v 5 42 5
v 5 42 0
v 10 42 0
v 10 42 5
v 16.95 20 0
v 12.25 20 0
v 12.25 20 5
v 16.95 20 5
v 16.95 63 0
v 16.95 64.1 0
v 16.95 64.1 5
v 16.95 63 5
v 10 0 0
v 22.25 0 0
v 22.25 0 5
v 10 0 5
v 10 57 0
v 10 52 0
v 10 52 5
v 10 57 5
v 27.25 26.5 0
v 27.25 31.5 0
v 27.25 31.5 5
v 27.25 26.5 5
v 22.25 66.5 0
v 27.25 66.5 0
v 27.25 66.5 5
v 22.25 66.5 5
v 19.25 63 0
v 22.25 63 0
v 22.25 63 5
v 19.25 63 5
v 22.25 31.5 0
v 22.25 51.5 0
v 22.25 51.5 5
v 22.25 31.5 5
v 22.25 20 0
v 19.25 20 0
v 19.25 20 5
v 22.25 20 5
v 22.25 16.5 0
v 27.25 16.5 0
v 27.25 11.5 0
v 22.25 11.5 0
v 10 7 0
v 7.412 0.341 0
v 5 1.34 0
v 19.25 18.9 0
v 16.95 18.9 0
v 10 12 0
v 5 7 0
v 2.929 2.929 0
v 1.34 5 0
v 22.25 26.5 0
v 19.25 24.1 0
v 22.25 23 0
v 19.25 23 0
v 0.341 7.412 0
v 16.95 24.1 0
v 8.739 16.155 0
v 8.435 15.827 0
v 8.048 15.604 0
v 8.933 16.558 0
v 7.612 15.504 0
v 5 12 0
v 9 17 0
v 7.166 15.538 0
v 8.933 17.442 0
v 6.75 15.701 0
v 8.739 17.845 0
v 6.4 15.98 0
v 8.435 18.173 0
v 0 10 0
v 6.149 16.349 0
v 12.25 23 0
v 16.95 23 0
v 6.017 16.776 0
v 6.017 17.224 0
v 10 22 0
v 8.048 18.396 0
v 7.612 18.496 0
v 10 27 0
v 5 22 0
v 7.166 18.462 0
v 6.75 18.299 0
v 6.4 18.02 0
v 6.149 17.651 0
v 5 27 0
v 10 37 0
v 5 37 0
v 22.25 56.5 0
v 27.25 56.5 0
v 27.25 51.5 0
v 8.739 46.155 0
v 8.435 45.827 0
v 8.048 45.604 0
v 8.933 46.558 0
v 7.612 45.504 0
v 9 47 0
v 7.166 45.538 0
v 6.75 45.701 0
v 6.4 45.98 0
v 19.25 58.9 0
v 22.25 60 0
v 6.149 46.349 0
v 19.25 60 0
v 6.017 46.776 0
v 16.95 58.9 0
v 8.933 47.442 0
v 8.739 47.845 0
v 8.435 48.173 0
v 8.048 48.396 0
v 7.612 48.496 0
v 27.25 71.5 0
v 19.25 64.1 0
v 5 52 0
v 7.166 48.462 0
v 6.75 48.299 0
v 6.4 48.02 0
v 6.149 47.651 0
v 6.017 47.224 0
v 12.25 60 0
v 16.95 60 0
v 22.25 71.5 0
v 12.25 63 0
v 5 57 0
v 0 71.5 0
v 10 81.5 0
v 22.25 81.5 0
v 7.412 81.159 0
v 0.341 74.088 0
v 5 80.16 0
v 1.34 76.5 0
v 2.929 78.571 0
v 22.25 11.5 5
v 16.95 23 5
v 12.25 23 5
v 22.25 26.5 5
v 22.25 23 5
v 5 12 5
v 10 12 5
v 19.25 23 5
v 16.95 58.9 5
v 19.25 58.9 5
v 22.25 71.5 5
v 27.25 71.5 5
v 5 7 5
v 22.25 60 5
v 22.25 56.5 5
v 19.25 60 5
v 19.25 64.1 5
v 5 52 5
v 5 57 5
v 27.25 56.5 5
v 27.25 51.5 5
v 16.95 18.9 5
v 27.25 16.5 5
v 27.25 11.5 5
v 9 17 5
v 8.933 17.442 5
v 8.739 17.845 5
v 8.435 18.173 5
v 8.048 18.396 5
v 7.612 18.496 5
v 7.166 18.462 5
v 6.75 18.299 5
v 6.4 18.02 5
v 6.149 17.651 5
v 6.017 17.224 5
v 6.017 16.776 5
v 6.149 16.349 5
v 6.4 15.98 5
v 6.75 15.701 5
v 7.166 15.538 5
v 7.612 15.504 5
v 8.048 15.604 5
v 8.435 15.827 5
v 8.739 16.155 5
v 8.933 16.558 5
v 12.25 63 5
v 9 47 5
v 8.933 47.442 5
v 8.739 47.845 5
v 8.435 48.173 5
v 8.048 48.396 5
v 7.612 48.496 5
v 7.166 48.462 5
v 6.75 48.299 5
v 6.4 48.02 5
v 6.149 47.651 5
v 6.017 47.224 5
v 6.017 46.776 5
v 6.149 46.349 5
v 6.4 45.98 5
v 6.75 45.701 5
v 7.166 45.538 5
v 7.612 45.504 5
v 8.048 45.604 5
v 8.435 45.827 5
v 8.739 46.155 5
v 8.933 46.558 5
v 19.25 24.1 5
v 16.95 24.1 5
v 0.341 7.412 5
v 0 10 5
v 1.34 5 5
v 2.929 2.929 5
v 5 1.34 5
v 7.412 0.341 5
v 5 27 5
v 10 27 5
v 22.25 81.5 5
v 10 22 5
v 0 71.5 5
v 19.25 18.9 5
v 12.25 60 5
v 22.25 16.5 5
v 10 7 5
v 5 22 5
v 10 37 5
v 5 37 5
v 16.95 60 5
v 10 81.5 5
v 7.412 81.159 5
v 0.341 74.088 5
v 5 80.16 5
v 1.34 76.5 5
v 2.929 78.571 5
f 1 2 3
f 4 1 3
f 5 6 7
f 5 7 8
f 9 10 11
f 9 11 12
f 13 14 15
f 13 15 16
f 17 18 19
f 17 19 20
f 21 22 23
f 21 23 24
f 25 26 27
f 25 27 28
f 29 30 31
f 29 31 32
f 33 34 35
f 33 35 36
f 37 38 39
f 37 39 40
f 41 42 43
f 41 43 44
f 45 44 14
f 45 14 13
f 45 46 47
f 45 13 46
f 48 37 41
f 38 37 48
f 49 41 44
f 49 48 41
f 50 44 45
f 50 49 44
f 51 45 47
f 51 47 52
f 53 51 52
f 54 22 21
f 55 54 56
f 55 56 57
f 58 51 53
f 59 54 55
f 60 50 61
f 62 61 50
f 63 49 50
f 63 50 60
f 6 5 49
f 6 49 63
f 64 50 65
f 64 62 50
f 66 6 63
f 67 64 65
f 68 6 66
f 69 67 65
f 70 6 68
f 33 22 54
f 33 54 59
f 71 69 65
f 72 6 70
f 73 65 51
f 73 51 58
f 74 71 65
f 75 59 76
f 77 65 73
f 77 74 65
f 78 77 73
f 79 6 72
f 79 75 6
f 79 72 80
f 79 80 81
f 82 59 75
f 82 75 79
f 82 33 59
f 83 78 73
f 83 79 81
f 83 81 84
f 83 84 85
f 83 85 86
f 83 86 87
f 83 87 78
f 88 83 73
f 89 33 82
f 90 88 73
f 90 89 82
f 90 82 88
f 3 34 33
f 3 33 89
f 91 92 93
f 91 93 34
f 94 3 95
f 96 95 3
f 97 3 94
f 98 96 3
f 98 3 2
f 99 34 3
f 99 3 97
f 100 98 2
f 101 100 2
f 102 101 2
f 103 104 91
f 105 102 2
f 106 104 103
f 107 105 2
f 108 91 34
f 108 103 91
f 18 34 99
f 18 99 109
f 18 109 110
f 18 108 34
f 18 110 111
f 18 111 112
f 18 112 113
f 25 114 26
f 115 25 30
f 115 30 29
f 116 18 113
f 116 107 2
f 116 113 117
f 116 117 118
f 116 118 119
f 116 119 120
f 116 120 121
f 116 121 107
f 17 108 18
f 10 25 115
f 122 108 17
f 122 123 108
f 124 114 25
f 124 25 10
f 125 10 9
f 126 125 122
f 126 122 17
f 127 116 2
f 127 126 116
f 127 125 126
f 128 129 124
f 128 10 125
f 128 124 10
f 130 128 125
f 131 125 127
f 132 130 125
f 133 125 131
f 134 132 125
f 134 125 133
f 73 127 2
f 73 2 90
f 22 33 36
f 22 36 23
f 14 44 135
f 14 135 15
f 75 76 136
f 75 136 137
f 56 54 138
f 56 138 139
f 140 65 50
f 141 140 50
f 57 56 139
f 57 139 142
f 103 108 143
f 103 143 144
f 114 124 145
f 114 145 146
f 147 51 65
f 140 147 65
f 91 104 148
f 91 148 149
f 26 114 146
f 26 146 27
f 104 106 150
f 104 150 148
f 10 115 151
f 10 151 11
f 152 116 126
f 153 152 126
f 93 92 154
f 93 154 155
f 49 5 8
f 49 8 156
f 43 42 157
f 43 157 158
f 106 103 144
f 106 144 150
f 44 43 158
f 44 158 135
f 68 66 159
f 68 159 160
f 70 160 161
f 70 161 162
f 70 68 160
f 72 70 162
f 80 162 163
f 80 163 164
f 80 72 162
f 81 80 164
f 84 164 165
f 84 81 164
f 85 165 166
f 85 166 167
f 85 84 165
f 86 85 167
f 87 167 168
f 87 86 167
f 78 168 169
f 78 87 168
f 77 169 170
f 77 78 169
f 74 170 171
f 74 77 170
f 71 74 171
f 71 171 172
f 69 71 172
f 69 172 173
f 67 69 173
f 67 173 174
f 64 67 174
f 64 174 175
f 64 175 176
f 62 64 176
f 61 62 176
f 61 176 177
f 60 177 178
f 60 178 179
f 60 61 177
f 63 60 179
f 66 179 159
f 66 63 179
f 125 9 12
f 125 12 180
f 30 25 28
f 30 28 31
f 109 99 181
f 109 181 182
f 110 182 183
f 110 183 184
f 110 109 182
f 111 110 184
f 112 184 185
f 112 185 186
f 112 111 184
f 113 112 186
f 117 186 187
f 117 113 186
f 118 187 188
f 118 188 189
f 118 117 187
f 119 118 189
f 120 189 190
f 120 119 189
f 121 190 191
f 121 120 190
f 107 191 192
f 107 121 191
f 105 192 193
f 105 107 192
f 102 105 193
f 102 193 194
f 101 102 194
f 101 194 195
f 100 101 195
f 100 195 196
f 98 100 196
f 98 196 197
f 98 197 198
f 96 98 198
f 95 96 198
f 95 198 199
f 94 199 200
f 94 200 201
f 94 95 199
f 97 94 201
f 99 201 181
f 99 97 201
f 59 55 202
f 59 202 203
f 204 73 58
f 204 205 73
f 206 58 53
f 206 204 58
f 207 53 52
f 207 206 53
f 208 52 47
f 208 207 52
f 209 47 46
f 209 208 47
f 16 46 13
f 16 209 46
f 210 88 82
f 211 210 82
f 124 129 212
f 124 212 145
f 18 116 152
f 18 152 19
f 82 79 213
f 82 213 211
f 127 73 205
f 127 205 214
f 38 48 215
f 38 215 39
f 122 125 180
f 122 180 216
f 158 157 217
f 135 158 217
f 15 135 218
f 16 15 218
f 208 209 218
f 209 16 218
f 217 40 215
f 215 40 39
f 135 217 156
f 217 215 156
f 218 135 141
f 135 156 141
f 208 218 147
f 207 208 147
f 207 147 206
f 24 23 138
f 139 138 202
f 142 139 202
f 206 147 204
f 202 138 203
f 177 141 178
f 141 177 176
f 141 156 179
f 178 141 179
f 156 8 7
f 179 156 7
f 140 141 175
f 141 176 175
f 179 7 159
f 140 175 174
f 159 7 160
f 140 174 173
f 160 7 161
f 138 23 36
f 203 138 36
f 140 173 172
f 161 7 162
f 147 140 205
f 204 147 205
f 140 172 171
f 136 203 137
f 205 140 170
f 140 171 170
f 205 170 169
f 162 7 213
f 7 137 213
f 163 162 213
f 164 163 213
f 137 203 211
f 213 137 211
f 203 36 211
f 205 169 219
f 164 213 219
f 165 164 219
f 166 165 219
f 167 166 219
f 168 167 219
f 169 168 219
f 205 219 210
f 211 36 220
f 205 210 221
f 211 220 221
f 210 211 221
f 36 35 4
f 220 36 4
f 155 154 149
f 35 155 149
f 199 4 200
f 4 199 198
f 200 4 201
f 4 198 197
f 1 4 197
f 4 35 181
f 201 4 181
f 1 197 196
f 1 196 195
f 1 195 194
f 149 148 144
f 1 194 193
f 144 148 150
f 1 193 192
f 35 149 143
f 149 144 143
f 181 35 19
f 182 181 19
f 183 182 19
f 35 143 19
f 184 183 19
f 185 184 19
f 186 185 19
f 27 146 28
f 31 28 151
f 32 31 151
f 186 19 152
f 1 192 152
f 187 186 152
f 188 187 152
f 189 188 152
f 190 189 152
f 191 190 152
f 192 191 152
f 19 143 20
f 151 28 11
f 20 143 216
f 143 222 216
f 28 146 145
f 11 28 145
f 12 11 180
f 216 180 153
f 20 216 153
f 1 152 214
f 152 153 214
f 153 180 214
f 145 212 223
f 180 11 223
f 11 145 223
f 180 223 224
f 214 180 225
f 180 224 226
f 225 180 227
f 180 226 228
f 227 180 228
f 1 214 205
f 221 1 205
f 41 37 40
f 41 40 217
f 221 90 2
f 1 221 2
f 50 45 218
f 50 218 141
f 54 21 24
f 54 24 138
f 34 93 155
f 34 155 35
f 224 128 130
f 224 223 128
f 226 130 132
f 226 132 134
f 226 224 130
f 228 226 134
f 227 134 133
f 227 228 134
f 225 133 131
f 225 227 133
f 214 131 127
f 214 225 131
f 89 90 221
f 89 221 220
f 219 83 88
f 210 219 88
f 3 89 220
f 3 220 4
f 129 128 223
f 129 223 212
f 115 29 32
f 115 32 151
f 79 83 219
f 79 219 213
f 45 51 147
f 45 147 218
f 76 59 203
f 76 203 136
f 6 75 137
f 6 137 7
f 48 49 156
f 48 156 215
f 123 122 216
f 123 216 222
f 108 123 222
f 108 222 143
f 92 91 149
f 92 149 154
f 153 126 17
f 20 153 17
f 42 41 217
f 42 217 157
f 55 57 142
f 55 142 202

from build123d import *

# Parameters (mm, degrees)
SKETCH1_R           = 1.5
SKETCH1_W           = 5
SKETCH1_H           = 5
BOSS_EXTRUDE1_DEPTH = 5
CONG_1_R            = 10


with BuildPart() as part:
    # Sketch1 → Boss-Extrude1 (new body)
    with BuildSketch(Plane.XY):
        Polygon((22.25, 81.5), (22.25, 71.5), (27.25, 71.5), (27.25, 66.5), (22.25, 66.5), (22.25, 63), (19.25, 63), (19.25, 64.1), (16.95, 64.1), (16.95, 63), (12.25, 63), (12.25, 60), (16.95, 60), (16.95, 58.9), (19.25, 58.9), (19.25, 60), (22.25, 60), (22.25, 56.5), (27.25, 56.5), (27.25, 51.5), (22.25, 51.5), (22.25, 31.5), (27.25, 31.5), (27.25, 26.5), (22.25, 26.5), (22.25, 23), (19.25, 23), (19.25, 24.1), (16.95, 24.1), (16.95, 23), (12.25, 23), (12.25, 20), (16.95, 20), (16.95, 18.9), (19.25, 18.9), (19.25, 20), (22.25, 20), (22.25, 16.5), (27.25, 16.5), (27.25, 11.5), (22.25, 11.5), (22.25, 0), (0, 0), (0, 81.5), align=None)
        with Locations((7.5, 47)):
            Circle(SKETCH1_R, mode=Mode.SUBTRACT)
        with Locations((7.5, 17)):
            Circle(SKETCH1_R, mode=Mode.SUBTRACT)
        with Locations((7.5, 39.5)):
            Rectangle(SKETCH1_W, SKETCH1_H, mode=Mode.SUBTRACT)
        with Locations((7.5, 54.5)):
            Rectangle(SKETCH1_W, SKETCH1_H, mode=Mode.SUBTRACT)
        with Locations((7.5, 9.5)):
            Rectangle(SKETCH1_W, SKETCH1_H, mode=Mode.SUBTRACT)
        with Locations((7.5, 24.5)):
            Rectangle(SKETCH1_W, SKETCH1_H, mode=Mode.SUBTRACT)
    extrude(amount=BOSS_EXTRUDE1_DEPTH)

    # Congé1
    cong_1_edges = [part.edges().sort_by_distance(p)[0] for p in [
        (0, 0, 2.5),
        (0, 81.5, 2.5),
    ]]
    fillet(cong_1_edges, radius=CONG_1_R)


solid = part.part
